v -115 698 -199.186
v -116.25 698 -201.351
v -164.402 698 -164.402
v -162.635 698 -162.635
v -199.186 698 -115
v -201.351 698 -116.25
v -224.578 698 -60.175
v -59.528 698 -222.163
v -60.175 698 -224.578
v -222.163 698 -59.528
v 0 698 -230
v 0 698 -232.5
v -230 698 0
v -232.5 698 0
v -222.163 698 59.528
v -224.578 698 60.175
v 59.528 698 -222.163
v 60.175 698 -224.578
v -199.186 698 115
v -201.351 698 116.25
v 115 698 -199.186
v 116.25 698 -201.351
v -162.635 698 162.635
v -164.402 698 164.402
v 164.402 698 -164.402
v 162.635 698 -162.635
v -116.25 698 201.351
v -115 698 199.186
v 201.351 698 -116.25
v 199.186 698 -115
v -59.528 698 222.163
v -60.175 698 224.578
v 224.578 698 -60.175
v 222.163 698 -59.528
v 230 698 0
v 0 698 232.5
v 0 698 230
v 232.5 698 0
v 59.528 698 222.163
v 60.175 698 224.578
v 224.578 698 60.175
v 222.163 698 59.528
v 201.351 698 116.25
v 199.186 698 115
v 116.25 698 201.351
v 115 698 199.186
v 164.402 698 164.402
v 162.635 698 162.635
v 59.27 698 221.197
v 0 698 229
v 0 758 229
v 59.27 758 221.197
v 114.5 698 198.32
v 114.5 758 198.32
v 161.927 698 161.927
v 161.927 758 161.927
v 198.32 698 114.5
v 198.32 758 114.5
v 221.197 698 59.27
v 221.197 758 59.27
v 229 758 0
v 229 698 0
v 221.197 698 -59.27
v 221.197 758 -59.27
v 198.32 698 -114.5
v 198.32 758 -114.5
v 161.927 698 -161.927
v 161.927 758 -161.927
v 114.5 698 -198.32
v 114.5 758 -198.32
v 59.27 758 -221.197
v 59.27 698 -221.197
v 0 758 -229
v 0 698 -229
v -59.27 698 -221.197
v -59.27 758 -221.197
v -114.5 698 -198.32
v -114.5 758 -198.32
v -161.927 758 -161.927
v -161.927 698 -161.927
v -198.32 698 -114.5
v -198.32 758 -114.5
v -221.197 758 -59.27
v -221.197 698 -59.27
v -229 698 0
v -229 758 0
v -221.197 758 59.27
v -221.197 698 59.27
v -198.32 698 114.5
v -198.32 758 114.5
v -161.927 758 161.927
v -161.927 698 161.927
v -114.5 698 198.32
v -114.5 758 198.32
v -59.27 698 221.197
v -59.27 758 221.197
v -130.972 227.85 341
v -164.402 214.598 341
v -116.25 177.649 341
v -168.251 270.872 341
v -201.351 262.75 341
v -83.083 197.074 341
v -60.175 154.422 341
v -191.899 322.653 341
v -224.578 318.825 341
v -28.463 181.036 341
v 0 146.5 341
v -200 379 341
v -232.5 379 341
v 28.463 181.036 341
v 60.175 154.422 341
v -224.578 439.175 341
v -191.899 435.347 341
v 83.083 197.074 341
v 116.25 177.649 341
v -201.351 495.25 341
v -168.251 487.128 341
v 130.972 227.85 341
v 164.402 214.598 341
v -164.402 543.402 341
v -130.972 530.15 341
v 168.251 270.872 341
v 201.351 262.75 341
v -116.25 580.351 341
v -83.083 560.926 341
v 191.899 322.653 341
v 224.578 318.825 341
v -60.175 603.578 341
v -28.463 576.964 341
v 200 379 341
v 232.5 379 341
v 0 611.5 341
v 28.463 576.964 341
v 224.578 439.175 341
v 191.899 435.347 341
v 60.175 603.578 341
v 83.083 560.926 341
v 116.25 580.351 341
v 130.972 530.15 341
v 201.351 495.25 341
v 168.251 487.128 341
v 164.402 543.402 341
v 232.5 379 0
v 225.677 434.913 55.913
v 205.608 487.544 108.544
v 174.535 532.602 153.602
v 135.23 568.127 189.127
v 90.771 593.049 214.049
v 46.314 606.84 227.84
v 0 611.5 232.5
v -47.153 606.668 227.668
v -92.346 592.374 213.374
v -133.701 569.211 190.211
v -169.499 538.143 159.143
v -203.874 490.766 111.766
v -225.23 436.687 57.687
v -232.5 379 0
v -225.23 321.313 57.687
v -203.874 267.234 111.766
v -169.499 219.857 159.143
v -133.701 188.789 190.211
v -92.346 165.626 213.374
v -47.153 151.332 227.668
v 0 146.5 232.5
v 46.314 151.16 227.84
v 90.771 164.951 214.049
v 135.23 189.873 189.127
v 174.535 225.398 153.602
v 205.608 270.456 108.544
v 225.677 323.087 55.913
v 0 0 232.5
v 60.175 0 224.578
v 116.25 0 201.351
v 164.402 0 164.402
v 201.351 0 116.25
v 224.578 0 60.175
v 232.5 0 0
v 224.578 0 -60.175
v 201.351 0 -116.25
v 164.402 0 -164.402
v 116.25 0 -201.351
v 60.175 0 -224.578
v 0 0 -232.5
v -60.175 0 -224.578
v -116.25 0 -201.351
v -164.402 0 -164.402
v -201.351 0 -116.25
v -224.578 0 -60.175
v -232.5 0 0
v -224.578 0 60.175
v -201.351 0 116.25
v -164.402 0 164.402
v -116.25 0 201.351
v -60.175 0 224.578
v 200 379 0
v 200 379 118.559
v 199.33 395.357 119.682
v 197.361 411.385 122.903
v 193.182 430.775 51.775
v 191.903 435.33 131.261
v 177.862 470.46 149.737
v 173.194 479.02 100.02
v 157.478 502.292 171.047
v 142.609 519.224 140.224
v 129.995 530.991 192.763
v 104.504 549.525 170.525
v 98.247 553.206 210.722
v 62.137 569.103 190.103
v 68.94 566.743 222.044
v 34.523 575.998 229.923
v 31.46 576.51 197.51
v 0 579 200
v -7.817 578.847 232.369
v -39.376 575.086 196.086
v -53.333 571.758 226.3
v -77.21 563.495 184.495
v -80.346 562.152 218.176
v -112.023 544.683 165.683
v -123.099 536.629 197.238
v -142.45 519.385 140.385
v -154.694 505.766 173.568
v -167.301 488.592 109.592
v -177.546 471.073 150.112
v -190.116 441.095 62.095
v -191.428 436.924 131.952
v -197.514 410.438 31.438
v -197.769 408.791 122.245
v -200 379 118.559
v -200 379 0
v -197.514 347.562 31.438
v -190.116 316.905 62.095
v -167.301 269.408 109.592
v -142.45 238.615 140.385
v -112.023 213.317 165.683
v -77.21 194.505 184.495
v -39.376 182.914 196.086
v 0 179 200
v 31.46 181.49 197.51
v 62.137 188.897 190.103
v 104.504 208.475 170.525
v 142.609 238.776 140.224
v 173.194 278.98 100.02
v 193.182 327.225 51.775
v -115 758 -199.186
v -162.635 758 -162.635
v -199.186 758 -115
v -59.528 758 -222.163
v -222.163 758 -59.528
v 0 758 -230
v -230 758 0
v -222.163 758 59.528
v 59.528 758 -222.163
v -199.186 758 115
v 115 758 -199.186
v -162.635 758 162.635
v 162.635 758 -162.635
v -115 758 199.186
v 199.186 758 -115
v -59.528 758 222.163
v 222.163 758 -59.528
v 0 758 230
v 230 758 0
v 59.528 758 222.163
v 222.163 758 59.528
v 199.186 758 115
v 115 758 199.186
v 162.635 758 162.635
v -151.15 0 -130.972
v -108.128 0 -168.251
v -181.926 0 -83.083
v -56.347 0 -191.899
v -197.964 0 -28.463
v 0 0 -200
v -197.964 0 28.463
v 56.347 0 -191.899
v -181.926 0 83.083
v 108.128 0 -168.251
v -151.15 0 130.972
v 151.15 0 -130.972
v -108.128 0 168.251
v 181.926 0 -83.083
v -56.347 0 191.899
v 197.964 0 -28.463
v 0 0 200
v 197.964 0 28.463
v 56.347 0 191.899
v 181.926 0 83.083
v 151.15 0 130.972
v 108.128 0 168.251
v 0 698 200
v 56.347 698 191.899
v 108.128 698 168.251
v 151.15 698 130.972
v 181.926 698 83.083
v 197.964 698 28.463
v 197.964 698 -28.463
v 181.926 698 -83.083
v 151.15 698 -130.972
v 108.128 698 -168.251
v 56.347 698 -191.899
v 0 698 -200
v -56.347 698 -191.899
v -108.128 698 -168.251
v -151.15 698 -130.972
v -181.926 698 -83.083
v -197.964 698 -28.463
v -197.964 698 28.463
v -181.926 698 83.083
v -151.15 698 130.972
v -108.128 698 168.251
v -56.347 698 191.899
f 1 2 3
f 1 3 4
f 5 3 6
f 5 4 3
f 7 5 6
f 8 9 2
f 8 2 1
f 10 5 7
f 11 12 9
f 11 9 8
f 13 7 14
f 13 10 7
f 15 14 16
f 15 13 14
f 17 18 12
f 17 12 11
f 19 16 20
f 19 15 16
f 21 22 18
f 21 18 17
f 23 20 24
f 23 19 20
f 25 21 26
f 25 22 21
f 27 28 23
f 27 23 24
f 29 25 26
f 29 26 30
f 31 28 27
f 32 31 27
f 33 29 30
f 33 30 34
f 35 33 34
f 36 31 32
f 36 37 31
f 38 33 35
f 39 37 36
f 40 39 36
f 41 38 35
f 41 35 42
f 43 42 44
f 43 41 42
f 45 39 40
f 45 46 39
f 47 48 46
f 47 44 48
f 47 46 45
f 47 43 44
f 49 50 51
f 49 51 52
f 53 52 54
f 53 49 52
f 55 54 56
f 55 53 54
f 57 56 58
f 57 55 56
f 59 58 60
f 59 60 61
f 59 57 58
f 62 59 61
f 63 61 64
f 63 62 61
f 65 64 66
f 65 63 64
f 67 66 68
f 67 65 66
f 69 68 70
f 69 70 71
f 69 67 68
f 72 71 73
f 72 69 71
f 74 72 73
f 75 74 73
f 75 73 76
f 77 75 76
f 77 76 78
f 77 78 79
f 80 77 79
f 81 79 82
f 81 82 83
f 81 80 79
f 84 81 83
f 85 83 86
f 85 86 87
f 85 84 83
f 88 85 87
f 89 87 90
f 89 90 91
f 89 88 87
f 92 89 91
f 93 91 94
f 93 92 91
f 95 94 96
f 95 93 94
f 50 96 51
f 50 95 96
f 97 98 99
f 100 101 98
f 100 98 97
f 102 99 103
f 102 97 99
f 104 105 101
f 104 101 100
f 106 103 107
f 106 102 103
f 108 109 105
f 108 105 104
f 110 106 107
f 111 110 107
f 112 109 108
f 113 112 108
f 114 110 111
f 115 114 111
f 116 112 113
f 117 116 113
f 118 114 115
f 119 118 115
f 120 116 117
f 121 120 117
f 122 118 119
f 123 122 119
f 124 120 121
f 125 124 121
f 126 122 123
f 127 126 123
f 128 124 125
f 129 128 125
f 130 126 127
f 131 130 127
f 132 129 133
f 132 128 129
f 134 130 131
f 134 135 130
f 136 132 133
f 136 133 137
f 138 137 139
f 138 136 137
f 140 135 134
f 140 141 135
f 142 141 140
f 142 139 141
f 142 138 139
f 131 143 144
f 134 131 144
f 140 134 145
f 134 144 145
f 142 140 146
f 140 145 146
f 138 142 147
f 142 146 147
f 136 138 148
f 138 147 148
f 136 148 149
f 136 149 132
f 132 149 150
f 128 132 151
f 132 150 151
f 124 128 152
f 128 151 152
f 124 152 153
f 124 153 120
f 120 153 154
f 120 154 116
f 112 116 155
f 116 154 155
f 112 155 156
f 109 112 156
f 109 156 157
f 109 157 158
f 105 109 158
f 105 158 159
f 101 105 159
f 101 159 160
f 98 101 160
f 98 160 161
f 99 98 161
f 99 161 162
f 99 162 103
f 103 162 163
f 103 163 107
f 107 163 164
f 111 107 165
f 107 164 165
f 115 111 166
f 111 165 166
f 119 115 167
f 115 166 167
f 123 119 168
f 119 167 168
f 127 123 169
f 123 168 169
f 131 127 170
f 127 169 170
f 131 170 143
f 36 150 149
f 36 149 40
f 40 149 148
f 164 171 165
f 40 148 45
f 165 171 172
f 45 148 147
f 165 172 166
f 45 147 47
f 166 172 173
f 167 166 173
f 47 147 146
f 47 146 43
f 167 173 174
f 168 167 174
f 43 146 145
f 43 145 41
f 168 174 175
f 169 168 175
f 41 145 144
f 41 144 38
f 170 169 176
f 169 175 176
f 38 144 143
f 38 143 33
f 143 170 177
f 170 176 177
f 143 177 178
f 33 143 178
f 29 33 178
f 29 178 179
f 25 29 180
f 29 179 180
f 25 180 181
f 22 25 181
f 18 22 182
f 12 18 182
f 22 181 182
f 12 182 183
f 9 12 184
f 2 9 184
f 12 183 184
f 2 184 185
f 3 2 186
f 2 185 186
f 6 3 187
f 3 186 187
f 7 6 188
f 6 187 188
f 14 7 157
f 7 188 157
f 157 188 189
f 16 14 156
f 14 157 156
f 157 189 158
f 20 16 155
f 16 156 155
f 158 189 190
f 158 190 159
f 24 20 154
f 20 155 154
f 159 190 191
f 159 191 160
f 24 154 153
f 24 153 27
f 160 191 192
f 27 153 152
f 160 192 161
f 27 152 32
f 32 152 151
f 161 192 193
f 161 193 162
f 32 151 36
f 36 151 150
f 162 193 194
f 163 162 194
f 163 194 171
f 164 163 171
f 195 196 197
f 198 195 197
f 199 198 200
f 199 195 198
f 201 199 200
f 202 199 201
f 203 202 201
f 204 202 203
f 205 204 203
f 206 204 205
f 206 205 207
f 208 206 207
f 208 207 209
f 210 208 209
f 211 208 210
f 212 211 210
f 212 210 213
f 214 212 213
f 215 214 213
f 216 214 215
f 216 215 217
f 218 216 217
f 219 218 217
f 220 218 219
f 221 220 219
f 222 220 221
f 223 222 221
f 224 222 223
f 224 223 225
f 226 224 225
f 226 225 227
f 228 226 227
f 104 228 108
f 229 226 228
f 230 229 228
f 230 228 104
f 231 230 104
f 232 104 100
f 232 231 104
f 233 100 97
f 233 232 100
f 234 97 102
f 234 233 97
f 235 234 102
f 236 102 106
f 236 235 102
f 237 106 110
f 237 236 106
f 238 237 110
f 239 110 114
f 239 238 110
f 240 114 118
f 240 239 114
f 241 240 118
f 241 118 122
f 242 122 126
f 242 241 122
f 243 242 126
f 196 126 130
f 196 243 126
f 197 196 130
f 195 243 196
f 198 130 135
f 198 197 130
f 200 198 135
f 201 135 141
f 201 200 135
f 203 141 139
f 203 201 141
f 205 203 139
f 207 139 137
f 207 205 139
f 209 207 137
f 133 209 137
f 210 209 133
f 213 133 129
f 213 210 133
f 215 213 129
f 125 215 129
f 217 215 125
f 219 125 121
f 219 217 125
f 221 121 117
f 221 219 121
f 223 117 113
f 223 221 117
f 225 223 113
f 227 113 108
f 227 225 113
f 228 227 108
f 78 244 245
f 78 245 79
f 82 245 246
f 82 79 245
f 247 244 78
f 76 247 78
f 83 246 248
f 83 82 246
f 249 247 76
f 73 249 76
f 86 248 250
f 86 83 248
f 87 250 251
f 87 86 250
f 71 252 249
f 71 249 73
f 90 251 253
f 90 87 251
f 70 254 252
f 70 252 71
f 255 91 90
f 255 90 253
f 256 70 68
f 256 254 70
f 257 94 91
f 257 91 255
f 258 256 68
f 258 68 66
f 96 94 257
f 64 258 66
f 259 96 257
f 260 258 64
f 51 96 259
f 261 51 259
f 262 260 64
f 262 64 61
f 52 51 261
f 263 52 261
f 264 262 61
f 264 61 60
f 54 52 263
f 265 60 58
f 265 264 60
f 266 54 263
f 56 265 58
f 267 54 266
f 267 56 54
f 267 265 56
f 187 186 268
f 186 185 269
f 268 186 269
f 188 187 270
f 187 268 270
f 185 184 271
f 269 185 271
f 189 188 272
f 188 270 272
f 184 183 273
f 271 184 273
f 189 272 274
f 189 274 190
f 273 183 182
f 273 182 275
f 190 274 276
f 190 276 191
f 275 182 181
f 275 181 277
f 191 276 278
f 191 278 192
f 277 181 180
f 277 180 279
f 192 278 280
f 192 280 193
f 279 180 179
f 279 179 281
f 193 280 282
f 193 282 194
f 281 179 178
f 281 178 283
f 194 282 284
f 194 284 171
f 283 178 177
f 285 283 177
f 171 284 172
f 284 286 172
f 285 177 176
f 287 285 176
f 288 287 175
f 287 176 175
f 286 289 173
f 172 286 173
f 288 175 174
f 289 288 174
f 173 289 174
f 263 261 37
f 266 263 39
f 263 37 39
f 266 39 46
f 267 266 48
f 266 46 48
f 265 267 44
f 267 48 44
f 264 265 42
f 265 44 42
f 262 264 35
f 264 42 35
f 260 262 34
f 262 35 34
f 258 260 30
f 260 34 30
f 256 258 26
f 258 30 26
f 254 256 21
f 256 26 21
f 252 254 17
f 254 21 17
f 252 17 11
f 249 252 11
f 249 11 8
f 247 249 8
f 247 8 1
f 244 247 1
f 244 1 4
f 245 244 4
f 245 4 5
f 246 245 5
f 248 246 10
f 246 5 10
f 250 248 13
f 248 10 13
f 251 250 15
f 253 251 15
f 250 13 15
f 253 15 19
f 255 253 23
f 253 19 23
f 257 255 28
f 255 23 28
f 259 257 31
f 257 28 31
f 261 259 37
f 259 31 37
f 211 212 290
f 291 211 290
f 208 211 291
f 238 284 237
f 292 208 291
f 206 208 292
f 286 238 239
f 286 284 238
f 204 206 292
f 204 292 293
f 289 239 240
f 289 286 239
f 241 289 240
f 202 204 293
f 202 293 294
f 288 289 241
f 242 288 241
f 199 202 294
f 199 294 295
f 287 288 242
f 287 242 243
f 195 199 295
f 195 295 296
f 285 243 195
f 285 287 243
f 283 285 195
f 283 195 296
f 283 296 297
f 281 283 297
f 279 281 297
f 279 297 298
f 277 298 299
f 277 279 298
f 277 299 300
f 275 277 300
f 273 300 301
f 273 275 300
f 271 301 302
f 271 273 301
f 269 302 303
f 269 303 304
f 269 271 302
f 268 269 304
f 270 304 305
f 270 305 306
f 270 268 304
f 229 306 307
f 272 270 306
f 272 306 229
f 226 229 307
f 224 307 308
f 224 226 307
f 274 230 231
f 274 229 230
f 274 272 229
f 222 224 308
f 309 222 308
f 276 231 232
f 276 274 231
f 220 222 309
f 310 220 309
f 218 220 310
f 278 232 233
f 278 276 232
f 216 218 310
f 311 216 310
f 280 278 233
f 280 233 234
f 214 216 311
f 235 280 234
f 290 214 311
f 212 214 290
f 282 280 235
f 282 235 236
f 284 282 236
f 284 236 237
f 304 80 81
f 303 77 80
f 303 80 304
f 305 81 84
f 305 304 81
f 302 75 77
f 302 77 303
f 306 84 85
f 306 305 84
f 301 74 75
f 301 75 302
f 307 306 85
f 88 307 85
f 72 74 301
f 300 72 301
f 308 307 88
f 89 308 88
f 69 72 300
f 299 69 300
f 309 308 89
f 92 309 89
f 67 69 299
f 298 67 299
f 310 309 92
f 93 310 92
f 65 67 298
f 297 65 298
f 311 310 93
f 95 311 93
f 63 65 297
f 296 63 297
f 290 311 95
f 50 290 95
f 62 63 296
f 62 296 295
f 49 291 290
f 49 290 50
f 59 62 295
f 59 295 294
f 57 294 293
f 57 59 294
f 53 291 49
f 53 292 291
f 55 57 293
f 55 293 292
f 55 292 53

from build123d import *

# Parameters (mm, degrees)
SKETCH_1_R          = 232.5
SKETCH_1_R_2        = 200
EXTRUDE_1_DEPTH     = 698
SKETCH_11_R         = 230
SKETCH_11_R_2       = 229
EXTRUDE_1_2_DEPTH   = 60
SKETCH_12_R         = 232.5
SKETCH_12_R_2       = 200
EXTRUDE_2_DEPTH     = 341
SKETCH_13_R         = 200
CUT_EXTRUDE_1_DEPTH = 380
CUT_EXTRUDE_START   = -1000
SKETCH_14_R         = 200
CUT_EXTRUDE_2_DEPTH = 1000


with BuildPart() as part:
    # Эскиз1 → Extrude 1 (new body)
    with BuildSketch(Plane(origin=(0, 0, 0), x_dir=(1, 0, 0), z_dir=(0, 1, 0))):
        with Locations(Location((0, 0, 0), (0, 0, 270))):
            Circle(SKETCH_1_R)
        with Locations(Location((0, 0, 0), (0, 0, 270))):
            Circle(SKETCH_1_R_2, mode=Mode.SUBTRACT)
    extrude(amount=EXTRUDE_1_DEPTH)

    # Эскиз11 → Extrude 1 2 (add)
    with BuildSketch(Plane(origin=(0, 698, 0), x_dir=(1, 0, 0), z_dir=(0, 1, 0))):
        with Locations(Location((0, 0, 0), (0, 0, 270))):
            Circle(SKETCH_11_R)
        with Locations(Location((0, 0, 0), (0, 0, 270))):
            Circle(SKETCH_11_R_2, mode=Mode.SUBTRACT)
    extrude(amount=EXTRUDE_1_2_DEPTH)

    # Эскиз12 → Бобышка-Вытянуть2 (add)
    with BuildSketch(Plane.XY):
        with Locations((0, 379)):
            Circle(SKETCH_12_R)
        with Locations(Location((0, 379, 0), (0, 0, 180))):
            Circle(SKETCH_12_R_2, mode=Mode.SUBTRACT)
    extrude(amount=EXTRUDE_2_DEPTH)

    # Эскиз13 → Вырез-Вытянуть1 (cut)
    with BuildSketch(Plane.XY):
        with Locations((0, 379)):
            Circle(SKETCH_13_R)
    extrude(amount=CUT_EXTRUDE_1_DEPTH, mode=Mode.SUBTRACT)

    # Эскиз14 → Вырез-Вытянуть2 (cut)
    with BuildSketch(Plane(origin=(0, 698, 0), x_dir=(1, 0, 0), z_dir=(0, 1, 0)).offset(CUT_EXTRUDE_START)):
        with Locations(Location((0, 0, 0), (0, 0, 270))):
            Circle(SKETCH_14_R)
    extrude(amount=CUT_EXTRUDE_2_DEPTH, mode=Mode.SUBTRACT)


solid = part.part
